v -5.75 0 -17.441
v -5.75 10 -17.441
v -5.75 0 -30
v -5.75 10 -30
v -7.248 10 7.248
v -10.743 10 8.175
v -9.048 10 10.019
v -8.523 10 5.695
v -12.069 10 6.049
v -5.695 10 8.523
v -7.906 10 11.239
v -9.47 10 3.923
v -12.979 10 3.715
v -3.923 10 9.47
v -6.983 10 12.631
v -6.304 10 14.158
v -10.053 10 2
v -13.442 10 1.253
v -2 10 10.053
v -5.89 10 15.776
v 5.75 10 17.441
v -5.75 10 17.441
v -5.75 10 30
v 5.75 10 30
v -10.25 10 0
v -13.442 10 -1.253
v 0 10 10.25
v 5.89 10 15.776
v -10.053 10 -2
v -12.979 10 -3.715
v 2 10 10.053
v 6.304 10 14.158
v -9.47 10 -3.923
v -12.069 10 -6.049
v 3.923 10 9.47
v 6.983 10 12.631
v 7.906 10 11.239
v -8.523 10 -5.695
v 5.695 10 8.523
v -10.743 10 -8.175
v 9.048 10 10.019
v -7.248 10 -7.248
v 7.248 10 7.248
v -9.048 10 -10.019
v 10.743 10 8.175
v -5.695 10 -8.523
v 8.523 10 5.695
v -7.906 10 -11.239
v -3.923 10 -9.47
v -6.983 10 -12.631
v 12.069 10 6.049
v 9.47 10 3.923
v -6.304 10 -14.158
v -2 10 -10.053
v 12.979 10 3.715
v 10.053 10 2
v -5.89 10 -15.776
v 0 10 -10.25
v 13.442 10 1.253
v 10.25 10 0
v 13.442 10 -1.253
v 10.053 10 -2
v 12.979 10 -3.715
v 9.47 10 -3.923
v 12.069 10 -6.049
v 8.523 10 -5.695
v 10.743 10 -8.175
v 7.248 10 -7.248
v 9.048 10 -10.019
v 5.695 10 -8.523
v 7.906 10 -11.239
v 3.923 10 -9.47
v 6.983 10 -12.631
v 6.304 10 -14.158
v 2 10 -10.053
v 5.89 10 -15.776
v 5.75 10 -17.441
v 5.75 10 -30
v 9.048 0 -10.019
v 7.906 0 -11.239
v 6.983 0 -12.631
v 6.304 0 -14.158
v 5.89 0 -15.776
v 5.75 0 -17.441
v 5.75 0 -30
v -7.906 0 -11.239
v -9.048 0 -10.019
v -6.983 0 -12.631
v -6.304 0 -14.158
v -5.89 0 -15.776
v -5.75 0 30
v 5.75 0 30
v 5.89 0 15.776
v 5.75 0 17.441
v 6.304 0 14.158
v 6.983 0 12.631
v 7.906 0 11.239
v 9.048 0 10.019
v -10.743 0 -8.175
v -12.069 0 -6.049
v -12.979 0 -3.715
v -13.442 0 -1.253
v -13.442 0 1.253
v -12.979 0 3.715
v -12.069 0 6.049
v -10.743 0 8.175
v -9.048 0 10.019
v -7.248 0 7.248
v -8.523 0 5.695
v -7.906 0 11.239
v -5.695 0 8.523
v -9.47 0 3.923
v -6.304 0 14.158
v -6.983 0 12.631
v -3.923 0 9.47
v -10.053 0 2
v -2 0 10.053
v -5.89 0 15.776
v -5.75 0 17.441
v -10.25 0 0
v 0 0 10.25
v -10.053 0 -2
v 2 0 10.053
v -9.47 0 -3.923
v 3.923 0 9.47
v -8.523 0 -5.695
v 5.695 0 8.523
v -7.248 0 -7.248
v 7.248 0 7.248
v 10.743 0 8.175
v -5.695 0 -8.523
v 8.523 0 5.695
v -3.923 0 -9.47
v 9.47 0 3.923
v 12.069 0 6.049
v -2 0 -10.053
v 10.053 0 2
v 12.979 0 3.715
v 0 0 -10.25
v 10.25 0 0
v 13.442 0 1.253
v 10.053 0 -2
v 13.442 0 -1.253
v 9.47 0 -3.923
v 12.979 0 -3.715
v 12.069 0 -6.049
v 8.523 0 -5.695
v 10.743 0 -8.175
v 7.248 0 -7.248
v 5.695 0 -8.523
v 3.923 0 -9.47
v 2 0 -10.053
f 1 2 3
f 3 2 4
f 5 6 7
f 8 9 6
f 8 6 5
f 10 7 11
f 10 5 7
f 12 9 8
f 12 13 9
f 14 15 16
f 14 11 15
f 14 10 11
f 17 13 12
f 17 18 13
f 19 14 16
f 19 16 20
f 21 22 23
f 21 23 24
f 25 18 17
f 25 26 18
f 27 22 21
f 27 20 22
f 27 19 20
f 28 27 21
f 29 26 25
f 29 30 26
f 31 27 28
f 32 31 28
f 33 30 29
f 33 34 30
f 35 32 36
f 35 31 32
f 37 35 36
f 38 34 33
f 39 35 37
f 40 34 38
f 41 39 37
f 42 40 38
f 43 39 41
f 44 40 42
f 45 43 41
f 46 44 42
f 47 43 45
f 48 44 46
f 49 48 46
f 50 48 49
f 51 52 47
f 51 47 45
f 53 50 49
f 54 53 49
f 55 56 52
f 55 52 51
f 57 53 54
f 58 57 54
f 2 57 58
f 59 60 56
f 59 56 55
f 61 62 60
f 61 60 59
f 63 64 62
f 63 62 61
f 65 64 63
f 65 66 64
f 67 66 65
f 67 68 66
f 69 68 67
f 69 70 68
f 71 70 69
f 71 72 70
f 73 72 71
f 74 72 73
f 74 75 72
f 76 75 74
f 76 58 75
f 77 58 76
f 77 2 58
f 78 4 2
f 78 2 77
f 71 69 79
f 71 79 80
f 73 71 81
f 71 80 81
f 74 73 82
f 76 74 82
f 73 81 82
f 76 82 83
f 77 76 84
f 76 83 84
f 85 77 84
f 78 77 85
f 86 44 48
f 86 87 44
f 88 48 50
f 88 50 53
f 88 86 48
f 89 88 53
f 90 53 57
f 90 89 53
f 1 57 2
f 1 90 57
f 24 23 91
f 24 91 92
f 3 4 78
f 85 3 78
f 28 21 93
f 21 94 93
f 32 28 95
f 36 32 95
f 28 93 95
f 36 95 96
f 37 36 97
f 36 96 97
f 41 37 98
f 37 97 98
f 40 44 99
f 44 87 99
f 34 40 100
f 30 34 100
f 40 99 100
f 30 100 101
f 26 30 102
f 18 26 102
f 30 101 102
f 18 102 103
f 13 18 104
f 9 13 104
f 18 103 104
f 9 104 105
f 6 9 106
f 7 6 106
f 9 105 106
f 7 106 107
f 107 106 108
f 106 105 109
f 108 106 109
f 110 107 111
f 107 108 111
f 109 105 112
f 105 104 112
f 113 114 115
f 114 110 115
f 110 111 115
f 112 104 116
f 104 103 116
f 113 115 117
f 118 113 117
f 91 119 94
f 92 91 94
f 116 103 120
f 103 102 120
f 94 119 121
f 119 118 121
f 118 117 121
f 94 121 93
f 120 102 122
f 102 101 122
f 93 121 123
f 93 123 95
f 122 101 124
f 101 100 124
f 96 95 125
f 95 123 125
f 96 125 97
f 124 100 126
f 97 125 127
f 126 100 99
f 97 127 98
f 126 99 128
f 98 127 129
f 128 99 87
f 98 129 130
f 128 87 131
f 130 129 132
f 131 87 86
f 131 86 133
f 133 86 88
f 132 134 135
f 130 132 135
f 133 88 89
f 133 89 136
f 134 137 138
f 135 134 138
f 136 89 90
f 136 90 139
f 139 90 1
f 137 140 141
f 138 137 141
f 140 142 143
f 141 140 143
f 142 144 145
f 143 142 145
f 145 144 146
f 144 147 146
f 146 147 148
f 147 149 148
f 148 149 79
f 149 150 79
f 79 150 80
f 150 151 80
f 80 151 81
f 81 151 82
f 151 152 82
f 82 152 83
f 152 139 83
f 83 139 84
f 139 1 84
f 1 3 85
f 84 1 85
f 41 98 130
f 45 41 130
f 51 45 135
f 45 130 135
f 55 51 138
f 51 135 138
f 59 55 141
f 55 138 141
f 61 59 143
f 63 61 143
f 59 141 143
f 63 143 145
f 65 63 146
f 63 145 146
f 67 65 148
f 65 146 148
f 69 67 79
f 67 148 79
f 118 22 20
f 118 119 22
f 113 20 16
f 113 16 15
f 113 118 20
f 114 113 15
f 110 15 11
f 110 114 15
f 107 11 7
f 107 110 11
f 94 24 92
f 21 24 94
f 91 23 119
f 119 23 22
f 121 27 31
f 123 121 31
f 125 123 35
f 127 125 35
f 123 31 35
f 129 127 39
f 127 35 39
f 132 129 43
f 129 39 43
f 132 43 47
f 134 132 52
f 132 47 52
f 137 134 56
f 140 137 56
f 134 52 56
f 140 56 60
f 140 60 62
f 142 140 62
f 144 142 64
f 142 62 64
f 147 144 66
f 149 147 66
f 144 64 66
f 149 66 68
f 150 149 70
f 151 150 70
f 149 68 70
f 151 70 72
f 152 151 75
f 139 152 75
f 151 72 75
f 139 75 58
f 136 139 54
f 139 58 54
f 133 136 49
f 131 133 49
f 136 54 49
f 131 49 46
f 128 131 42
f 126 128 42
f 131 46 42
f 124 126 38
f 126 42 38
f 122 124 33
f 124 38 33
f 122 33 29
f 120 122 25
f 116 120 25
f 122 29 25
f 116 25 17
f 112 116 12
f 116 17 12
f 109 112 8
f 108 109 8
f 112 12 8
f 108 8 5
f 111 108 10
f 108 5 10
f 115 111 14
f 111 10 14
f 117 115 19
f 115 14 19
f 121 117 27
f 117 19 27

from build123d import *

# Parameters (mm, degrees)
SKETCH_1_R          = 13.5
EXTRUDE_1_DEPTH     = 10
SKETCH_2_W          = 11.5
SKETCH_2_H          = 60
EXTRUDE_2_DEPTH     = 10
SKETCH_3_R          = 10.25
CUT_EXTRUDE_1_DEPTH = 10
FILLET_1_R          = 10


with BuildPart() as part:
    # 草图1 → 凸台-拉伸1 (new body)
    with BuildSketch(Plane(origin=(0, 0, 0), x_dir=(1, 0, 0), z_dir=(0, 1, 0))):
        with Locations(Location((0, 0, 0), (0, 0, 270))):
            Circle(SKETCH_1_R)
    extrude(amount=EXTRUDE_1_DEPTH)

    # 草图2 → 凸台-拉伸2 (add)
    with BuildSketch(Plane(origin=(0, 10, 0), x_dir=(1, 0, 0), z_dir=(0, 1, 0))):
        Rectangle(SKETCH_2_W, SKETCH_2_H)
    extrude(amount=-EXTRUDE_2_DEPTH)

    # 草图3 → 切除-拉伸1 (cut)
    with BuildSketch(Plane(origin=(0, 10, 0), x_dir=(1, 0, 0), z_dir=(0, 1, 0))):
        with Locations(Location((0, 0, 0), (0, 0, 270))):
            Circle(SKETCH_3_R)
    extrude(amount=-CUT_EXTRUDE_1_DEPTH, mode=Mode.SUBTRACT)

    # 圆角1
    fillet_1_edges = [part.edges().sort_by_distance(p)[0] for p in [
        (-5.75, 5, -12.2142335),
        (-5.75, 5, 12.2142335),
        (5.75, 5, 12.2142335),
        (5.75, 5, -12.2142335),
    ]]
    fillet(fillet_1_edges, radius=FILLET_1_R)


solid = part.part
